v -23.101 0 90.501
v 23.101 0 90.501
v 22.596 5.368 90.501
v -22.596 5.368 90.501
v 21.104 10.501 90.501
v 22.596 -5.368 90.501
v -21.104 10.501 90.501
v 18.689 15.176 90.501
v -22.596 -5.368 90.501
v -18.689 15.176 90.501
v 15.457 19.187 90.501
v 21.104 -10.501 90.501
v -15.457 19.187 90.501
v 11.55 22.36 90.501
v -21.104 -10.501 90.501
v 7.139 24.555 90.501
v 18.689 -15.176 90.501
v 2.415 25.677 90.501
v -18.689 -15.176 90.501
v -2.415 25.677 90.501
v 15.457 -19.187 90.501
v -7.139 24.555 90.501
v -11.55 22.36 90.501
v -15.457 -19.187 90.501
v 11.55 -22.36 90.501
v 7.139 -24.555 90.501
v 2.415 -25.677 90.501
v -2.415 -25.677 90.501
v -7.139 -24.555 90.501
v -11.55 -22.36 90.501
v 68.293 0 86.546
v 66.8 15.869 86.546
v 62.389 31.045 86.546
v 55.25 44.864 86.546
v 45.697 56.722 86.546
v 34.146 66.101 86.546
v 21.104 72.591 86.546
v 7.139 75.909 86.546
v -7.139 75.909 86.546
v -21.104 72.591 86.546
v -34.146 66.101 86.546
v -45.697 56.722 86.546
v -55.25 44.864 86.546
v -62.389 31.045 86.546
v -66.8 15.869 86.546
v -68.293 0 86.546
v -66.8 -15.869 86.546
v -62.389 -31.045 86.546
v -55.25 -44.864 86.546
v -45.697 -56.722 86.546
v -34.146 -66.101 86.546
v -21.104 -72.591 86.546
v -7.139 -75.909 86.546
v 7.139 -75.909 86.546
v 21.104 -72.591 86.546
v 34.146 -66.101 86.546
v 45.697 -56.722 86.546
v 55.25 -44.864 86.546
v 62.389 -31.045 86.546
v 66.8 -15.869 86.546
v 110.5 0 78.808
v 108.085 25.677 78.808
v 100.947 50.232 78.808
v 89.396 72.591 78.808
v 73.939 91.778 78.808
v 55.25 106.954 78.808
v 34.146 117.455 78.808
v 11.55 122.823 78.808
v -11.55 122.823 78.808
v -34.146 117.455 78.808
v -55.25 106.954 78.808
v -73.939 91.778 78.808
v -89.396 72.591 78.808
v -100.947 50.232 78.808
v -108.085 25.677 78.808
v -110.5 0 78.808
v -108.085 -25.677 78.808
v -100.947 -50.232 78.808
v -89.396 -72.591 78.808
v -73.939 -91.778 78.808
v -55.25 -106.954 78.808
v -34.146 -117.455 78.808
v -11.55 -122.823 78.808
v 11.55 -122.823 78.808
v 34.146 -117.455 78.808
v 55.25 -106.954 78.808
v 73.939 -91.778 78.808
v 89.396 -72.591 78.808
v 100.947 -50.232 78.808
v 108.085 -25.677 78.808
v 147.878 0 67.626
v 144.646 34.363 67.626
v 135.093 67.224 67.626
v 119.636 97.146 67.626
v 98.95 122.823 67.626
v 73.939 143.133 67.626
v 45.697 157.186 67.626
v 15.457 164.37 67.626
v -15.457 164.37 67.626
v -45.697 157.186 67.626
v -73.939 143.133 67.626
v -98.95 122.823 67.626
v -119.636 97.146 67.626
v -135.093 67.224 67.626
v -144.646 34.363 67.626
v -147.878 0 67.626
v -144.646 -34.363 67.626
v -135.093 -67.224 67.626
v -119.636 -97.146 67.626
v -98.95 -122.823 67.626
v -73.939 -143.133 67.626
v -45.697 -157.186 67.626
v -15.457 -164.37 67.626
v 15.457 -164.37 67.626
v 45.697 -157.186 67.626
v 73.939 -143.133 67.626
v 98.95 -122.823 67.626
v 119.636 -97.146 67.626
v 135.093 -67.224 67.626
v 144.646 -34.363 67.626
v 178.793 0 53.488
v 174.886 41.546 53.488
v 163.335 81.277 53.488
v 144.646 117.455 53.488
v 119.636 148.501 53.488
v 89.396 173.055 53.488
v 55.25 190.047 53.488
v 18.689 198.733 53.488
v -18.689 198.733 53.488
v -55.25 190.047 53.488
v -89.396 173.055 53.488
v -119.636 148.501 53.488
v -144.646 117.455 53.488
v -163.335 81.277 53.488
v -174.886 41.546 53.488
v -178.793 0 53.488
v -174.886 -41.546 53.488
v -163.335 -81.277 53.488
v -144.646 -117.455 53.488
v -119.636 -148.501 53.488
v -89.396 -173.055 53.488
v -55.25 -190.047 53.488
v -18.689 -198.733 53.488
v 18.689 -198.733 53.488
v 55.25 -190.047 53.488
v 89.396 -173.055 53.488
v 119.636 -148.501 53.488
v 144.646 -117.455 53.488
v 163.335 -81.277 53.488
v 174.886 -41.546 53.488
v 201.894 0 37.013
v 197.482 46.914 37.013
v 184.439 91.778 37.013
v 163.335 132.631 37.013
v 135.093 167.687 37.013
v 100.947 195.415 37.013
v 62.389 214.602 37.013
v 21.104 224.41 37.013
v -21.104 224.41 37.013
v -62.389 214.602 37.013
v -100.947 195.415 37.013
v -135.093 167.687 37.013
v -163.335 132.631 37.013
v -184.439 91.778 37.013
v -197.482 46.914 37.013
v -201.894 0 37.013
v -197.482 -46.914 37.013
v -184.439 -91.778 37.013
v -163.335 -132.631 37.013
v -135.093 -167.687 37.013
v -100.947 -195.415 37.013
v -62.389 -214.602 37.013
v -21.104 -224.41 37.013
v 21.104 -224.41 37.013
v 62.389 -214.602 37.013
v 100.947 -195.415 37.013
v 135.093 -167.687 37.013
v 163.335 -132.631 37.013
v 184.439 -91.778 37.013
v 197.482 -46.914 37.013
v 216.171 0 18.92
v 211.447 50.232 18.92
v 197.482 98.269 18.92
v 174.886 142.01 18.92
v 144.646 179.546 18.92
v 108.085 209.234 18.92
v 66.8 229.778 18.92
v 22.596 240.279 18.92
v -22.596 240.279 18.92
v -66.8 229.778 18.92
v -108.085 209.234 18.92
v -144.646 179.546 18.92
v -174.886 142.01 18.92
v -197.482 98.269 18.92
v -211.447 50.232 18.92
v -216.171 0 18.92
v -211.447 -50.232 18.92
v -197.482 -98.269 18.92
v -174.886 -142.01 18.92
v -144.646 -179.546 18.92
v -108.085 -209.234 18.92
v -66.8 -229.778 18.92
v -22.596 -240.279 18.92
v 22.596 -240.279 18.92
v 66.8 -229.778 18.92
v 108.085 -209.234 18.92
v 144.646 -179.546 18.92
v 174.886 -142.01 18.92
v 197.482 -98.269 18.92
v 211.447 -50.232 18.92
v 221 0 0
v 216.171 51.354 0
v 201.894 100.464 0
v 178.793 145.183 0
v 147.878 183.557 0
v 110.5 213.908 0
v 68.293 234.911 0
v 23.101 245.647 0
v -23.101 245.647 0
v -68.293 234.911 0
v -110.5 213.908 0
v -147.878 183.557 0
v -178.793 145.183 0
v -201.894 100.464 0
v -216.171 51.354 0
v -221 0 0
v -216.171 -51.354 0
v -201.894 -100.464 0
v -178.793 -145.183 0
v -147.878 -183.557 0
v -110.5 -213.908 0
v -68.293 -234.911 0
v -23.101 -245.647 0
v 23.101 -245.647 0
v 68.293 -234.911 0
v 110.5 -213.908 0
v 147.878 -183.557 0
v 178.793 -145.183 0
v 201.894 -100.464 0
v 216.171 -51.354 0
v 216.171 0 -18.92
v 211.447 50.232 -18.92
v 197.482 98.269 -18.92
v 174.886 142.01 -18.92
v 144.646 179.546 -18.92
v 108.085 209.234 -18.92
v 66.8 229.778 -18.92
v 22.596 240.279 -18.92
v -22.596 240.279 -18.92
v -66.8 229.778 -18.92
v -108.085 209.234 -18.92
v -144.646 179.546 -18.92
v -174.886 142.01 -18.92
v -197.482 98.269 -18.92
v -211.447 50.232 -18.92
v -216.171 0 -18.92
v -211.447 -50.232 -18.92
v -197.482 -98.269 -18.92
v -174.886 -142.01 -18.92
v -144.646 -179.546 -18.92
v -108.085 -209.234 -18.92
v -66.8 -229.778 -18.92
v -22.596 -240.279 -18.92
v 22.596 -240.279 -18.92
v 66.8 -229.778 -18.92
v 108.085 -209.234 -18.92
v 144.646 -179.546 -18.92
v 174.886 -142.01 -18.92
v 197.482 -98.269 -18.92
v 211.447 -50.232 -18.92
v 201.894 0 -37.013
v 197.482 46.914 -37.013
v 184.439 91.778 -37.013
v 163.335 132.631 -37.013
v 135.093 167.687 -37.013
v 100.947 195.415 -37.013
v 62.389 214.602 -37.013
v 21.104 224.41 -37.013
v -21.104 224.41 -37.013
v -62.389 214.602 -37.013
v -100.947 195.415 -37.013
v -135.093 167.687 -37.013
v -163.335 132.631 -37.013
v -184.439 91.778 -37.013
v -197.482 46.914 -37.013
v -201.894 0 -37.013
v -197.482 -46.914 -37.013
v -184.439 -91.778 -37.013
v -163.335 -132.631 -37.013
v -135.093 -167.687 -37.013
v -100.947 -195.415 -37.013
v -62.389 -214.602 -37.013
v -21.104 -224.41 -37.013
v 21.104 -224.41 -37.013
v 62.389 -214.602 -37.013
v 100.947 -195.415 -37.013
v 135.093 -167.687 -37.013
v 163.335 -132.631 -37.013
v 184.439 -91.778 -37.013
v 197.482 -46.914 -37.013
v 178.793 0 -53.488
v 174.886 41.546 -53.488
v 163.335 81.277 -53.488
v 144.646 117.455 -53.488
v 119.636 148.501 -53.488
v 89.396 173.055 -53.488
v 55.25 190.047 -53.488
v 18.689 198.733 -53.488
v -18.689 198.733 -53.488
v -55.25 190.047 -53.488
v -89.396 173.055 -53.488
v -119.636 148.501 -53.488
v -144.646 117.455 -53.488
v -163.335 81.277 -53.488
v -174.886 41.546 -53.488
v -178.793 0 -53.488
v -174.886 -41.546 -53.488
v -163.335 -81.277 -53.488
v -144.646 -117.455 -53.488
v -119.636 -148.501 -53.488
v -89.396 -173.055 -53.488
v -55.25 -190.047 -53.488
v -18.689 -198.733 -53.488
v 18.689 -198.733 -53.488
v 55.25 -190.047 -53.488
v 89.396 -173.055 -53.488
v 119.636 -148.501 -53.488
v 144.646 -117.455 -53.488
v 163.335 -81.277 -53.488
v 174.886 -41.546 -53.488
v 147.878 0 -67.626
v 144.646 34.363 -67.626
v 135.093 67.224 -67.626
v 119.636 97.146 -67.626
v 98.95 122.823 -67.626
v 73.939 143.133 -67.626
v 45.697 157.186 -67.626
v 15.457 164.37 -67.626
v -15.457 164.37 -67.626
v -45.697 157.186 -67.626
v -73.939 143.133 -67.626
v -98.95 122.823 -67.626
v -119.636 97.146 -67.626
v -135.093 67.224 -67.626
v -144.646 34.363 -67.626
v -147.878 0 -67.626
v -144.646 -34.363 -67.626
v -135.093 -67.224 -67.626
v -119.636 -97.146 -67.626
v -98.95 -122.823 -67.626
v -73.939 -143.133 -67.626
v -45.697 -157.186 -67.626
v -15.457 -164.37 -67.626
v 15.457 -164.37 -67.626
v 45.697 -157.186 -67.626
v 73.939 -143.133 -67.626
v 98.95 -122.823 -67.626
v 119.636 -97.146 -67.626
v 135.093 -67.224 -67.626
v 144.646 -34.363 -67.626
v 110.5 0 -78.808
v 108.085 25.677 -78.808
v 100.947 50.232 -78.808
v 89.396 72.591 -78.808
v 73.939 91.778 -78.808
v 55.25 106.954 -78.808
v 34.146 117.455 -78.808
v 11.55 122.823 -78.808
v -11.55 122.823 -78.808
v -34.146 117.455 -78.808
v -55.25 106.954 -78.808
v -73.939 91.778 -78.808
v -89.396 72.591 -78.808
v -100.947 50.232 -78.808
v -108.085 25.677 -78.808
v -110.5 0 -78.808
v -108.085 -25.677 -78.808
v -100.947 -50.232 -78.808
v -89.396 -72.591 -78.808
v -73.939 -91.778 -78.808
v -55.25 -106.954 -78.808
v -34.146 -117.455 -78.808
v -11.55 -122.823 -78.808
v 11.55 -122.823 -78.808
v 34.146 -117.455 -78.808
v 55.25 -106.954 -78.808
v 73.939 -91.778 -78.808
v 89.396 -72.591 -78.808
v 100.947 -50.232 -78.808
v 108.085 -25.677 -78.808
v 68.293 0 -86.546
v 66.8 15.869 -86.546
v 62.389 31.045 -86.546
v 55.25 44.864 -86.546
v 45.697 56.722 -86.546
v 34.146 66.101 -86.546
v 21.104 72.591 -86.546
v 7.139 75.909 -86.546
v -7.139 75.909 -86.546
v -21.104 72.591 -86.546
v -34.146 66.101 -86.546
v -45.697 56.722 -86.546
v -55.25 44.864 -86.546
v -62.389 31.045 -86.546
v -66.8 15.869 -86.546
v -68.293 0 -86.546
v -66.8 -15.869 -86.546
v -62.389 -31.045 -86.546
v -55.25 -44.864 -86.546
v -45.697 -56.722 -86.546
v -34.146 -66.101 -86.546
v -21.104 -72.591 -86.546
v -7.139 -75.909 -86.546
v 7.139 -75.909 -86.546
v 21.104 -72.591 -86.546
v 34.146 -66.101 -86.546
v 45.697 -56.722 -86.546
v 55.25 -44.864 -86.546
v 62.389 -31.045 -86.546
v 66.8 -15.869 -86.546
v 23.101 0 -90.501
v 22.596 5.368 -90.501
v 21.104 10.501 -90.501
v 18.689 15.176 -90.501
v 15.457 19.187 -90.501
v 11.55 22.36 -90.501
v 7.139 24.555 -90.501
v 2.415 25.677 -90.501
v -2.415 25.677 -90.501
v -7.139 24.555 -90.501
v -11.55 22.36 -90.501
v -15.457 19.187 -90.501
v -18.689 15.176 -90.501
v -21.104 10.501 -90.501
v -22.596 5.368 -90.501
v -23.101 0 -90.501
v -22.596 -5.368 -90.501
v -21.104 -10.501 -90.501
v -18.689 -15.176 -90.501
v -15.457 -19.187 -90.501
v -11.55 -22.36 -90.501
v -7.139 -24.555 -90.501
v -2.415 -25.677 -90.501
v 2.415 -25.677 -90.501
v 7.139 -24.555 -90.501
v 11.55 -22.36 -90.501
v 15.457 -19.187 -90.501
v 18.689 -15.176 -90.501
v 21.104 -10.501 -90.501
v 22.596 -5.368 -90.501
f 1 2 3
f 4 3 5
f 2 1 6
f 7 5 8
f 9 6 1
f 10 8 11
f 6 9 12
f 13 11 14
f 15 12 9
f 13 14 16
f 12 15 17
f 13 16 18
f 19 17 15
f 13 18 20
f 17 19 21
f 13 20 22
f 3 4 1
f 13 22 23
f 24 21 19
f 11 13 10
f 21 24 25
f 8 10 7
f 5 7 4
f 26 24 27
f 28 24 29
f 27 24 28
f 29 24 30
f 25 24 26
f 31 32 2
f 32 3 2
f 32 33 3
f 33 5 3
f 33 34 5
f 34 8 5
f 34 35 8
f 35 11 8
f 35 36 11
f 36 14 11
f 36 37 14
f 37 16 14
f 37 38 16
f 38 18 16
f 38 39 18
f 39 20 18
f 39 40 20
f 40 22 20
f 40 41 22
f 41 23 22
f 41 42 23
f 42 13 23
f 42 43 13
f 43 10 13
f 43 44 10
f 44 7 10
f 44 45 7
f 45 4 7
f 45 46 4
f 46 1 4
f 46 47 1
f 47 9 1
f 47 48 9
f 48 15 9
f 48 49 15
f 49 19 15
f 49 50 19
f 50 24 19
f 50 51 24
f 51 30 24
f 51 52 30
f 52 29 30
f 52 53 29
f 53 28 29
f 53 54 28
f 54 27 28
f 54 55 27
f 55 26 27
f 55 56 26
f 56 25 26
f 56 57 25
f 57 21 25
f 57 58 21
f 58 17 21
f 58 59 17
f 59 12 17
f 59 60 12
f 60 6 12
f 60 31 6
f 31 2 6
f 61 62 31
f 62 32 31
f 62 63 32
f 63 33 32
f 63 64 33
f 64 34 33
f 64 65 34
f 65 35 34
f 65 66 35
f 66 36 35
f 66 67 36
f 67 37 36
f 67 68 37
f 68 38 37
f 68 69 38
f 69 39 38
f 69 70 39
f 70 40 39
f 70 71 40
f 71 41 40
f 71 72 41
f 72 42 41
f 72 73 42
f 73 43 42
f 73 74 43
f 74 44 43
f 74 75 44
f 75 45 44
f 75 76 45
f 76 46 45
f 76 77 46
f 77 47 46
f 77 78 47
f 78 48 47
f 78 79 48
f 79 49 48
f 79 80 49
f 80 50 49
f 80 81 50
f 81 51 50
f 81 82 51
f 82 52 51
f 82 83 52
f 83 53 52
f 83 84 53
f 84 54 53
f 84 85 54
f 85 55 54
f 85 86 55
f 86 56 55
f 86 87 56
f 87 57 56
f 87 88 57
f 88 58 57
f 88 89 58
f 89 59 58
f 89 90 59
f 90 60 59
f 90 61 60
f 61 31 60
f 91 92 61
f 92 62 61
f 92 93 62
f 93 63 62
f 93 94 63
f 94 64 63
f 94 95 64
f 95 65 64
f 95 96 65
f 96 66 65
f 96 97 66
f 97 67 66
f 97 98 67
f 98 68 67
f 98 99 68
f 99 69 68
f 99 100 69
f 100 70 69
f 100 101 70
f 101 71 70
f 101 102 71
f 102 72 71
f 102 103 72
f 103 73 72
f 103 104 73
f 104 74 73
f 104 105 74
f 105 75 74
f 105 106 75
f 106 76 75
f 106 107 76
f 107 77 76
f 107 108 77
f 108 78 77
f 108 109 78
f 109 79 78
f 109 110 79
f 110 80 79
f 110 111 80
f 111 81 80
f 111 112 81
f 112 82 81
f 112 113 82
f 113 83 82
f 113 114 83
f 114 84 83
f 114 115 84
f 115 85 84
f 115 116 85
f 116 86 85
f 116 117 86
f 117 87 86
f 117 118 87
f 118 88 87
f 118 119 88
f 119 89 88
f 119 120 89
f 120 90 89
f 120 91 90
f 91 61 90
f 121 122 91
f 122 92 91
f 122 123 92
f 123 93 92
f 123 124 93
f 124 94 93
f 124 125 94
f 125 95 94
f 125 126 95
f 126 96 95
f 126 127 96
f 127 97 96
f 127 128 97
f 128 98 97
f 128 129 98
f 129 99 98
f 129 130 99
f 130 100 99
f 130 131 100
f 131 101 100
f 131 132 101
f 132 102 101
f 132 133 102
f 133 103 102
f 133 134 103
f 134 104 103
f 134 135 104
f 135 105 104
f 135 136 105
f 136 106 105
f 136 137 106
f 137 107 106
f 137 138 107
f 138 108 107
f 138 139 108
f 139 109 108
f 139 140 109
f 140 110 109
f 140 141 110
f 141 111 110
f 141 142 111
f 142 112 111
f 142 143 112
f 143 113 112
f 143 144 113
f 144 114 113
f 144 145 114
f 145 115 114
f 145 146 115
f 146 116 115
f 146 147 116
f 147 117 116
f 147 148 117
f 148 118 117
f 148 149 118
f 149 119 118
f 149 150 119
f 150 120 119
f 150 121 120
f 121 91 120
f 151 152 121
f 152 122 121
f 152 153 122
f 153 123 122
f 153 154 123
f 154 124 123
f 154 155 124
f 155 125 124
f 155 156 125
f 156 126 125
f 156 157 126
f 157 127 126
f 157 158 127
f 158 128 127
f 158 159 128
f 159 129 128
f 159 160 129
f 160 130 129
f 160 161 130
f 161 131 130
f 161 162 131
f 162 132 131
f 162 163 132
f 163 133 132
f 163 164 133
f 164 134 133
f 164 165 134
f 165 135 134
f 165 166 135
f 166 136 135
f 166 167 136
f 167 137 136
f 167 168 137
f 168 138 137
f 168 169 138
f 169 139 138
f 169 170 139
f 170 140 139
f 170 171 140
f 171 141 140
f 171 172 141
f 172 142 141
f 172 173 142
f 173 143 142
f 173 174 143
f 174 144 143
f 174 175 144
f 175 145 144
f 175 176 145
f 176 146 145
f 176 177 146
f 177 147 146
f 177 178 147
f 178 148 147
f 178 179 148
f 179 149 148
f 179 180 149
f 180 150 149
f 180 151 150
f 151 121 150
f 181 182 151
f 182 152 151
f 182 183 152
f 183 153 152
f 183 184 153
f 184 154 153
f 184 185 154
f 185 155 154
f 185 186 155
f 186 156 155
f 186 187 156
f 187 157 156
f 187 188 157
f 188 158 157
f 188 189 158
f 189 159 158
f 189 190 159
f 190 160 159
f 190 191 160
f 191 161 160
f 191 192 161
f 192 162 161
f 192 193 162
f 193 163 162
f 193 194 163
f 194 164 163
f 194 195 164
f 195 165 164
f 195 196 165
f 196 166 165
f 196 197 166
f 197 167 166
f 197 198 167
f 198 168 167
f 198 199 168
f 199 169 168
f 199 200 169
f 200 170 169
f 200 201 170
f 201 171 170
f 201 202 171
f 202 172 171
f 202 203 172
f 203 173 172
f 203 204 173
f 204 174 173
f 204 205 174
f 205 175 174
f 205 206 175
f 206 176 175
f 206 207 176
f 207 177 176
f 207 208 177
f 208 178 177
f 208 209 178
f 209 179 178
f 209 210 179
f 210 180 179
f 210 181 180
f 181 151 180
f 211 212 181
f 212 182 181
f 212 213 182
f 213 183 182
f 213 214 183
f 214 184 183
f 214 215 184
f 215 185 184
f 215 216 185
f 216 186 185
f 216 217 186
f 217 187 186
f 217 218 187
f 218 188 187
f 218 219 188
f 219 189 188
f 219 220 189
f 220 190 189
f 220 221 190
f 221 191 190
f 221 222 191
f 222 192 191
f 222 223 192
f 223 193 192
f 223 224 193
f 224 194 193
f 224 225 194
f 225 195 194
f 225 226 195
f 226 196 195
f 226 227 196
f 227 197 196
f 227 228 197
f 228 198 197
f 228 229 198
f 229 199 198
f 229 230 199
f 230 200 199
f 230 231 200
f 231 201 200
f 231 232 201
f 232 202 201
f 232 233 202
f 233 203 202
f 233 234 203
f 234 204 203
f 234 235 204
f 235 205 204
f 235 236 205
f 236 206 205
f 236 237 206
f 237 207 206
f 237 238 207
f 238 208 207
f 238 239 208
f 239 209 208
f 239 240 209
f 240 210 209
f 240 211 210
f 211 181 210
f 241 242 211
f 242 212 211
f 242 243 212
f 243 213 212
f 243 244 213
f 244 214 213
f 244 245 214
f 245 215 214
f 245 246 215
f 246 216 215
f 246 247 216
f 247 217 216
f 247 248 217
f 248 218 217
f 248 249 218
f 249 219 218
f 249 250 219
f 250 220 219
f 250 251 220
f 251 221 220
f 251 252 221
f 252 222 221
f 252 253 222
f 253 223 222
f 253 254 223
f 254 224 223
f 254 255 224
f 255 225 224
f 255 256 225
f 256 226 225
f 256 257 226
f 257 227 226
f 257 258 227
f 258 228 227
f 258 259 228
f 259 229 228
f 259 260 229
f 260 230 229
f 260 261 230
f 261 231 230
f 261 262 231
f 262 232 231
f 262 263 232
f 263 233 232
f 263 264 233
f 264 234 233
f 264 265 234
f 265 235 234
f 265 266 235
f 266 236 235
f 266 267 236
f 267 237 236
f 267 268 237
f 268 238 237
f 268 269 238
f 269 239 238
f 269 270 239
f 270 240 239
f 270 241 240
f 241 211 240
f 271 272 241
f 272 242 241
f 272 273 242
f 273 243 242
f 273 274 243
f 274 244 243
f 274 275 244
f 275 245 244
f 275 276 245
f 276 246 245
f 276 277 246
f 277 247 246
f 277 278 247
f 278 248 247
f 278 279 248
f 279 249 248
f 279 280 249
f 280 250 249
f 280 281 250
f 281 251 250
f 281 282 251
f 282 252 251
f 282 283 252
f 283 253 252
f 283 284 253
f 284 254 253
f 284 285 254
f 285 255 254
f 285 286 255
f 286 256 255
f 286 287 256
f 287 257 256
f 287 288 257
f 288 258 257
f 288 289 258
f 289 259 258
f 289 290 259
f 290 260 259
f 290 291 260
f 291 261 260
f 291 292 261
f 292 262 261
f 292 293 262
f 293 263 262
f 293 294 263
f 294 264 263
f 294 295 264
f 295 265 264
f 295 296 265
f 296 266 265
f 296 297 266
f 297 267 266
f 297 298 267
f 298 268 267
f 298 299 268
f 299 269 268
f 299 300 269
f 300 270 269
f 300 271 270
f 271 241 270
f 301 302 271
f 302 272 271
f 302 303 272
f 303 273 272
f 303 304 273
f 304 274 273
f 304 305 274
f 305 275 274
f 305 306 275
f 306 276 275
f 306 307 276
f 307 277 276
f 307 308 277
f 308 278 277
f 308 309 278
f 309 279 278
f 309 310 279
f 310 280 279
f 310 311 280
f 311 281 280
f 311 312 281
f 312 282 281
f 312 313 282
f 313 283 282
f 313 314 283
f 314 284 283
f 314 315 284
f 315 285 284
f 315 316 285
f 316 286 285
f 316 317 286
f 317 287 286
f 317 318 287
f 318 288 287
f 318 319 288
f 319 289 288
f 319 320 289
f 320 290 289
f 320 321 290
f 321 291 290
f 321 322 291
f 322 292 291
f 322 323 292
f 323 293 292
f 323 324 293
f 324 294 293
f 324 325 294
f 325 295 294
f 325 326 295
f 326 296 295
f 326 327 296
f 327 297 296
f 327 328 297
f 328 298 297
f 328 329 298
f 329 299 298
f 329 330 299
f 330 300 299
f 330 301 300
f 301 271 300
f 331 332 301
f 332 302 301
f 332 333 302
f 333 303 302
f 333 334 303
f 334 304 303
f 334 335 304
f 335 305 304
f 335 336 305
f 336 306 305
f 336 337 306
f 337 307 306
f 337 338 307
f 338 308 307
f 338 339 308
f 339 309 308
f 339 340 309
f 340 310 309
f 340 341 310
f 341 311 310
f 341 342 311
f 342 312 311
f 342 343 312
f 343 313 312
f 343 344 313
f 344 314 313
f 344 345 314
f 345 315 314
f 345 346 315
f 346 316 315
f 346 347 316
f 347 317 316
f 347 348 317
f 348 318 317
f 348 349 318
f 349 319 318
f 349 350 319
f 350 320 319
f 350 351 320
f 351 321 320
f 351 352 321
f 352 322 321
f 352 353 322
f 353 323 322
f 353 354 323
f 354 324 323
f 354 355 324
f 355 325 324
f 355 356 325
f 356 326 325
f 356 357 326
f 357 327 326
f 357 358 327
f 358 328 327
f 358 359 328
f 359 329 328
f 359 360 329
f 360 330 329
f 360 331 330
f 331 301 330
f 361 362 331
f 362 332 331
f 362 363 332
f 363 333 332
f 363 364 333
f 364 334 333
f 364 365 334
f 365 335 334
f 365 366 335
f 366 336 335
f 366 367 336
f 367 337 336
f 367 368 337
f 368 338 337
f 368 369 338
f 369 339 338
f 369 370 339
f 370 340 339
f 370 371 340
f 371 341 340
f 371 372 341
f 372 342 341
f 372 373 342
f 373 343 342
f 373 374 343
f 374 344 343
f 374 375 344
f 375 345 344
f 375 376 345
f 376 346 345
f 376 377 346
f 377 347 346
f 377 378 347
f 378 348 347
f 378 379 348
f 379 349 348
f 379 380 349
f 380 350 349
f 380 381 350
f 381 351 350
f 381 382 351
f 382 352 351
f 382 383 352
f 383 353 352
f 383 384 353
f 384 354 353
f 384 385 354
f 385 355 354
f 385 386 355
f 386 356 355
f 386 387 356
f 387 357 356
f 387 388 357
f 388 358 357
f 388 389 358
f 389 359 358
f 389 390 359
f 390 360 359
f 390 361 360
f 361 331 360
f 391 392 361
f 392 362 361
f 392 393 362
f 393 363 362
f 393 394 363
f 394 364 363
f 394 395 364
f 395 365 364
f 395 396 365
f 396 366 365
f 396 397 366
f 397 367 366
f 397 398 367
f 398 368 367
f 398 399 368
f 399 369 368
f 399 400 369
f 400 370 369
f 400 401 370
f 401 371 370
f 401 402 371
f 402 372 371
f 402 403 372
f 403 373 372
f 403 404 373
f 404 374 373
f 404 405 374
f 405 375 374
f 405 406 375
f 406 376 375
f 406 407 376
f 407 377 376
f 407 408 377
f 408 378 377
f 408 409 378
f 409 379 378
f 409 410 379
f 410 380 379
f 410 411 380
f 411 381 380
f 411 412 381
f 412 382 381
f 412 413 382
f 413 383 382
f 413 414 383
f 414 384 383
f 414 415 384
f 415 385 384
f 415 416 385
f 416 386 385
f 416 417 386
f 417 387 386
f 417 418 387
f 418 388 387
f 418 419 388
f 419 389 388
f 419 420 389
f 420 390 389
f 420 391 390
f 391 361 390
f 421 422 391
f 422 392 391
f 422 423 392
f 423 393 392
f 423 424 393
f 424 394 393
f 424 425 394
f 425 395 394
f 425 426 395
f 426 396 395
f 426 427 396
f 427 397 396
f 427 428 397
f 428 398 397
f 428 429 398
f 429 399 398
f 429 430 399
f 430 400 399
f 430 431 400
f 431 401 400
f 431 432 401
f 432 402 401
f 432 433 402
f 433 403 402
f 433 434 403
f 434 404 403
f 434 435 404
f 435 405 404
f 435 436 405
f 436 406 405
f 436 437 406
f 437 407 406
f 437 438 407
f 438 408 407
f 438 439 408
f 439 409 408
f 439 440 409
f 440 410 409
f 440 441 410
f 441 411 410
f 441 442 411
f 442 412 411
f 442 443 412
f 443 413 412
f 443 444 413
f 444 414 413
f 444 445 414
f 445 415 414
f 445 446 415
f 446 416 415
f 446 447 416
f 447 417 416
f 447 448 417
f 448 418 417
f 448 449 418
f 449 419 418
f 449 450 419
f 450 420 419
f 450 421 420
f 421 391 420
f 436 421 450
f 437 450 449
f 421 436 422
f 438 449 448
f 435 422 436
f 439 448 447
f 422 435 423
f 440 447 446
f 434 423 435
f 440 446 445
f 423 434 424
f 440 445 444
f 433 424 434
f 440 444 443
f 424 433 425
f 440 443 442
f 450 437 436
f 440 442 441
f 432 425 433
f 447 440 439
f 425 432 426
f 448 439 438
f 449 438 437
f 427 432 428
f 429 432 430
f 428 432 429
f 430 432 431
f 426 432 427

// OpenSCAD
// Generated by SolidPython 1.0.1 on 2020-07-29 00:46:53


scale(v = [17, 19, 7]) {
	sphere(r = 13);
}
/***********************************************
*********      SolidPython code:      **********
************************************************
 
# import packages: SolidPython
from solid import *
from solid.utils import *
from itertools import chain, combinations, permutations


class Resize:

    def __init__(self, scad_file):
        self.scad_file = scad_file
        #self.scad_file = import_scad(scad_file)
        # cone/cylinder param:
        self.r1 = 0
        self.r2 = 0
        self.h = 0
        # rectangular prism param:
        self.w = 0
        self.l = 0
        # ellipse param:
        self.r = 0

    # import OpenScad code (file name corresponds to shape)


    # classify shape + parameters
    def assign(self, param1, param2, param3):
        if self.scad_file == 'cone.scad':
            self.r1 = param1
            self.r2 = param2
            self.h = param3
        elif self.scad_file == 'cylinder.scad':
            self.r1 = param1
            self.r2 = param2
            self.h = param3
        elif self.scad_file == 'rectangularPrism.scad':
            self.h = param1
            self.l = param2
            self.w = param3
        else:
            self.r = param1
            self.h = param2

    # resize parameters
    def iterate(self):
        x = range(3, 20, 2)
        i = 1
        if self.scad_file == 'cone.scad':
            tempList = list(permutations(x, 2))
            for temp in tempList:
                param1 = temp[0]
                param2 = temp[1]
                filepath = 'produced_scad_files/' + 'cone' + str(param1) + '_' + str(param2) + '_' + '.scad'
                scad_render_to_file(cylinder(h=param1, r1=param2, r2=0), filepath)

        elif self.scad_file == 'cylinder.scad':
            tempList = list(permutations(x, 3))
            for temp in tempList:
                param1 = temp[0]
                param2 = temp[1]
                filepath = 'produced_scad_files/' + 'cylinder' + str(param1) + '_' + str(param2) + '_' + '.scad'
                scad_render_to_file(cylinder(h=param1, r1=param2, r2=param2), filepath)

        elif self.scad_file == 'rectangularPrism.scad':
            tempList = list(permutations(x, 3))
            for temp in tempList:
                param1 = temp[0]
                param2 = temp[1]
                param3 = temp[2]
                filepath = 'produced_scad_files/' + 'rectangularPrism' + str(param1) + '_' + str(param2) + '_' + str(
                    param3) + '.scad'
                scad_render_to_file(cube(size=(param1, param2, param3)), filepath)

        elif self.scad_file == 'ellipse.scad':
            tempList = list(permutations(x, 4))
            for temp in tempList:
                param1 = temp[0]
                param2 = temp[1]
                param3 = temp[2]
                param4 = temp[3]
                filepath = 'produced_scad_files/' + 'ellipse' + str(param1) + '_' + str(param2) + '_' + str(param3) + '_' + str(param4) + '.scad'
                scad_render_to_file(scale([param1, param2, param3])(sphere(r=param4)), filepath)

    def render_to_scadfile(self):
        scad_render_to_file(scad, 'example.scad') 
 
************************************************/
